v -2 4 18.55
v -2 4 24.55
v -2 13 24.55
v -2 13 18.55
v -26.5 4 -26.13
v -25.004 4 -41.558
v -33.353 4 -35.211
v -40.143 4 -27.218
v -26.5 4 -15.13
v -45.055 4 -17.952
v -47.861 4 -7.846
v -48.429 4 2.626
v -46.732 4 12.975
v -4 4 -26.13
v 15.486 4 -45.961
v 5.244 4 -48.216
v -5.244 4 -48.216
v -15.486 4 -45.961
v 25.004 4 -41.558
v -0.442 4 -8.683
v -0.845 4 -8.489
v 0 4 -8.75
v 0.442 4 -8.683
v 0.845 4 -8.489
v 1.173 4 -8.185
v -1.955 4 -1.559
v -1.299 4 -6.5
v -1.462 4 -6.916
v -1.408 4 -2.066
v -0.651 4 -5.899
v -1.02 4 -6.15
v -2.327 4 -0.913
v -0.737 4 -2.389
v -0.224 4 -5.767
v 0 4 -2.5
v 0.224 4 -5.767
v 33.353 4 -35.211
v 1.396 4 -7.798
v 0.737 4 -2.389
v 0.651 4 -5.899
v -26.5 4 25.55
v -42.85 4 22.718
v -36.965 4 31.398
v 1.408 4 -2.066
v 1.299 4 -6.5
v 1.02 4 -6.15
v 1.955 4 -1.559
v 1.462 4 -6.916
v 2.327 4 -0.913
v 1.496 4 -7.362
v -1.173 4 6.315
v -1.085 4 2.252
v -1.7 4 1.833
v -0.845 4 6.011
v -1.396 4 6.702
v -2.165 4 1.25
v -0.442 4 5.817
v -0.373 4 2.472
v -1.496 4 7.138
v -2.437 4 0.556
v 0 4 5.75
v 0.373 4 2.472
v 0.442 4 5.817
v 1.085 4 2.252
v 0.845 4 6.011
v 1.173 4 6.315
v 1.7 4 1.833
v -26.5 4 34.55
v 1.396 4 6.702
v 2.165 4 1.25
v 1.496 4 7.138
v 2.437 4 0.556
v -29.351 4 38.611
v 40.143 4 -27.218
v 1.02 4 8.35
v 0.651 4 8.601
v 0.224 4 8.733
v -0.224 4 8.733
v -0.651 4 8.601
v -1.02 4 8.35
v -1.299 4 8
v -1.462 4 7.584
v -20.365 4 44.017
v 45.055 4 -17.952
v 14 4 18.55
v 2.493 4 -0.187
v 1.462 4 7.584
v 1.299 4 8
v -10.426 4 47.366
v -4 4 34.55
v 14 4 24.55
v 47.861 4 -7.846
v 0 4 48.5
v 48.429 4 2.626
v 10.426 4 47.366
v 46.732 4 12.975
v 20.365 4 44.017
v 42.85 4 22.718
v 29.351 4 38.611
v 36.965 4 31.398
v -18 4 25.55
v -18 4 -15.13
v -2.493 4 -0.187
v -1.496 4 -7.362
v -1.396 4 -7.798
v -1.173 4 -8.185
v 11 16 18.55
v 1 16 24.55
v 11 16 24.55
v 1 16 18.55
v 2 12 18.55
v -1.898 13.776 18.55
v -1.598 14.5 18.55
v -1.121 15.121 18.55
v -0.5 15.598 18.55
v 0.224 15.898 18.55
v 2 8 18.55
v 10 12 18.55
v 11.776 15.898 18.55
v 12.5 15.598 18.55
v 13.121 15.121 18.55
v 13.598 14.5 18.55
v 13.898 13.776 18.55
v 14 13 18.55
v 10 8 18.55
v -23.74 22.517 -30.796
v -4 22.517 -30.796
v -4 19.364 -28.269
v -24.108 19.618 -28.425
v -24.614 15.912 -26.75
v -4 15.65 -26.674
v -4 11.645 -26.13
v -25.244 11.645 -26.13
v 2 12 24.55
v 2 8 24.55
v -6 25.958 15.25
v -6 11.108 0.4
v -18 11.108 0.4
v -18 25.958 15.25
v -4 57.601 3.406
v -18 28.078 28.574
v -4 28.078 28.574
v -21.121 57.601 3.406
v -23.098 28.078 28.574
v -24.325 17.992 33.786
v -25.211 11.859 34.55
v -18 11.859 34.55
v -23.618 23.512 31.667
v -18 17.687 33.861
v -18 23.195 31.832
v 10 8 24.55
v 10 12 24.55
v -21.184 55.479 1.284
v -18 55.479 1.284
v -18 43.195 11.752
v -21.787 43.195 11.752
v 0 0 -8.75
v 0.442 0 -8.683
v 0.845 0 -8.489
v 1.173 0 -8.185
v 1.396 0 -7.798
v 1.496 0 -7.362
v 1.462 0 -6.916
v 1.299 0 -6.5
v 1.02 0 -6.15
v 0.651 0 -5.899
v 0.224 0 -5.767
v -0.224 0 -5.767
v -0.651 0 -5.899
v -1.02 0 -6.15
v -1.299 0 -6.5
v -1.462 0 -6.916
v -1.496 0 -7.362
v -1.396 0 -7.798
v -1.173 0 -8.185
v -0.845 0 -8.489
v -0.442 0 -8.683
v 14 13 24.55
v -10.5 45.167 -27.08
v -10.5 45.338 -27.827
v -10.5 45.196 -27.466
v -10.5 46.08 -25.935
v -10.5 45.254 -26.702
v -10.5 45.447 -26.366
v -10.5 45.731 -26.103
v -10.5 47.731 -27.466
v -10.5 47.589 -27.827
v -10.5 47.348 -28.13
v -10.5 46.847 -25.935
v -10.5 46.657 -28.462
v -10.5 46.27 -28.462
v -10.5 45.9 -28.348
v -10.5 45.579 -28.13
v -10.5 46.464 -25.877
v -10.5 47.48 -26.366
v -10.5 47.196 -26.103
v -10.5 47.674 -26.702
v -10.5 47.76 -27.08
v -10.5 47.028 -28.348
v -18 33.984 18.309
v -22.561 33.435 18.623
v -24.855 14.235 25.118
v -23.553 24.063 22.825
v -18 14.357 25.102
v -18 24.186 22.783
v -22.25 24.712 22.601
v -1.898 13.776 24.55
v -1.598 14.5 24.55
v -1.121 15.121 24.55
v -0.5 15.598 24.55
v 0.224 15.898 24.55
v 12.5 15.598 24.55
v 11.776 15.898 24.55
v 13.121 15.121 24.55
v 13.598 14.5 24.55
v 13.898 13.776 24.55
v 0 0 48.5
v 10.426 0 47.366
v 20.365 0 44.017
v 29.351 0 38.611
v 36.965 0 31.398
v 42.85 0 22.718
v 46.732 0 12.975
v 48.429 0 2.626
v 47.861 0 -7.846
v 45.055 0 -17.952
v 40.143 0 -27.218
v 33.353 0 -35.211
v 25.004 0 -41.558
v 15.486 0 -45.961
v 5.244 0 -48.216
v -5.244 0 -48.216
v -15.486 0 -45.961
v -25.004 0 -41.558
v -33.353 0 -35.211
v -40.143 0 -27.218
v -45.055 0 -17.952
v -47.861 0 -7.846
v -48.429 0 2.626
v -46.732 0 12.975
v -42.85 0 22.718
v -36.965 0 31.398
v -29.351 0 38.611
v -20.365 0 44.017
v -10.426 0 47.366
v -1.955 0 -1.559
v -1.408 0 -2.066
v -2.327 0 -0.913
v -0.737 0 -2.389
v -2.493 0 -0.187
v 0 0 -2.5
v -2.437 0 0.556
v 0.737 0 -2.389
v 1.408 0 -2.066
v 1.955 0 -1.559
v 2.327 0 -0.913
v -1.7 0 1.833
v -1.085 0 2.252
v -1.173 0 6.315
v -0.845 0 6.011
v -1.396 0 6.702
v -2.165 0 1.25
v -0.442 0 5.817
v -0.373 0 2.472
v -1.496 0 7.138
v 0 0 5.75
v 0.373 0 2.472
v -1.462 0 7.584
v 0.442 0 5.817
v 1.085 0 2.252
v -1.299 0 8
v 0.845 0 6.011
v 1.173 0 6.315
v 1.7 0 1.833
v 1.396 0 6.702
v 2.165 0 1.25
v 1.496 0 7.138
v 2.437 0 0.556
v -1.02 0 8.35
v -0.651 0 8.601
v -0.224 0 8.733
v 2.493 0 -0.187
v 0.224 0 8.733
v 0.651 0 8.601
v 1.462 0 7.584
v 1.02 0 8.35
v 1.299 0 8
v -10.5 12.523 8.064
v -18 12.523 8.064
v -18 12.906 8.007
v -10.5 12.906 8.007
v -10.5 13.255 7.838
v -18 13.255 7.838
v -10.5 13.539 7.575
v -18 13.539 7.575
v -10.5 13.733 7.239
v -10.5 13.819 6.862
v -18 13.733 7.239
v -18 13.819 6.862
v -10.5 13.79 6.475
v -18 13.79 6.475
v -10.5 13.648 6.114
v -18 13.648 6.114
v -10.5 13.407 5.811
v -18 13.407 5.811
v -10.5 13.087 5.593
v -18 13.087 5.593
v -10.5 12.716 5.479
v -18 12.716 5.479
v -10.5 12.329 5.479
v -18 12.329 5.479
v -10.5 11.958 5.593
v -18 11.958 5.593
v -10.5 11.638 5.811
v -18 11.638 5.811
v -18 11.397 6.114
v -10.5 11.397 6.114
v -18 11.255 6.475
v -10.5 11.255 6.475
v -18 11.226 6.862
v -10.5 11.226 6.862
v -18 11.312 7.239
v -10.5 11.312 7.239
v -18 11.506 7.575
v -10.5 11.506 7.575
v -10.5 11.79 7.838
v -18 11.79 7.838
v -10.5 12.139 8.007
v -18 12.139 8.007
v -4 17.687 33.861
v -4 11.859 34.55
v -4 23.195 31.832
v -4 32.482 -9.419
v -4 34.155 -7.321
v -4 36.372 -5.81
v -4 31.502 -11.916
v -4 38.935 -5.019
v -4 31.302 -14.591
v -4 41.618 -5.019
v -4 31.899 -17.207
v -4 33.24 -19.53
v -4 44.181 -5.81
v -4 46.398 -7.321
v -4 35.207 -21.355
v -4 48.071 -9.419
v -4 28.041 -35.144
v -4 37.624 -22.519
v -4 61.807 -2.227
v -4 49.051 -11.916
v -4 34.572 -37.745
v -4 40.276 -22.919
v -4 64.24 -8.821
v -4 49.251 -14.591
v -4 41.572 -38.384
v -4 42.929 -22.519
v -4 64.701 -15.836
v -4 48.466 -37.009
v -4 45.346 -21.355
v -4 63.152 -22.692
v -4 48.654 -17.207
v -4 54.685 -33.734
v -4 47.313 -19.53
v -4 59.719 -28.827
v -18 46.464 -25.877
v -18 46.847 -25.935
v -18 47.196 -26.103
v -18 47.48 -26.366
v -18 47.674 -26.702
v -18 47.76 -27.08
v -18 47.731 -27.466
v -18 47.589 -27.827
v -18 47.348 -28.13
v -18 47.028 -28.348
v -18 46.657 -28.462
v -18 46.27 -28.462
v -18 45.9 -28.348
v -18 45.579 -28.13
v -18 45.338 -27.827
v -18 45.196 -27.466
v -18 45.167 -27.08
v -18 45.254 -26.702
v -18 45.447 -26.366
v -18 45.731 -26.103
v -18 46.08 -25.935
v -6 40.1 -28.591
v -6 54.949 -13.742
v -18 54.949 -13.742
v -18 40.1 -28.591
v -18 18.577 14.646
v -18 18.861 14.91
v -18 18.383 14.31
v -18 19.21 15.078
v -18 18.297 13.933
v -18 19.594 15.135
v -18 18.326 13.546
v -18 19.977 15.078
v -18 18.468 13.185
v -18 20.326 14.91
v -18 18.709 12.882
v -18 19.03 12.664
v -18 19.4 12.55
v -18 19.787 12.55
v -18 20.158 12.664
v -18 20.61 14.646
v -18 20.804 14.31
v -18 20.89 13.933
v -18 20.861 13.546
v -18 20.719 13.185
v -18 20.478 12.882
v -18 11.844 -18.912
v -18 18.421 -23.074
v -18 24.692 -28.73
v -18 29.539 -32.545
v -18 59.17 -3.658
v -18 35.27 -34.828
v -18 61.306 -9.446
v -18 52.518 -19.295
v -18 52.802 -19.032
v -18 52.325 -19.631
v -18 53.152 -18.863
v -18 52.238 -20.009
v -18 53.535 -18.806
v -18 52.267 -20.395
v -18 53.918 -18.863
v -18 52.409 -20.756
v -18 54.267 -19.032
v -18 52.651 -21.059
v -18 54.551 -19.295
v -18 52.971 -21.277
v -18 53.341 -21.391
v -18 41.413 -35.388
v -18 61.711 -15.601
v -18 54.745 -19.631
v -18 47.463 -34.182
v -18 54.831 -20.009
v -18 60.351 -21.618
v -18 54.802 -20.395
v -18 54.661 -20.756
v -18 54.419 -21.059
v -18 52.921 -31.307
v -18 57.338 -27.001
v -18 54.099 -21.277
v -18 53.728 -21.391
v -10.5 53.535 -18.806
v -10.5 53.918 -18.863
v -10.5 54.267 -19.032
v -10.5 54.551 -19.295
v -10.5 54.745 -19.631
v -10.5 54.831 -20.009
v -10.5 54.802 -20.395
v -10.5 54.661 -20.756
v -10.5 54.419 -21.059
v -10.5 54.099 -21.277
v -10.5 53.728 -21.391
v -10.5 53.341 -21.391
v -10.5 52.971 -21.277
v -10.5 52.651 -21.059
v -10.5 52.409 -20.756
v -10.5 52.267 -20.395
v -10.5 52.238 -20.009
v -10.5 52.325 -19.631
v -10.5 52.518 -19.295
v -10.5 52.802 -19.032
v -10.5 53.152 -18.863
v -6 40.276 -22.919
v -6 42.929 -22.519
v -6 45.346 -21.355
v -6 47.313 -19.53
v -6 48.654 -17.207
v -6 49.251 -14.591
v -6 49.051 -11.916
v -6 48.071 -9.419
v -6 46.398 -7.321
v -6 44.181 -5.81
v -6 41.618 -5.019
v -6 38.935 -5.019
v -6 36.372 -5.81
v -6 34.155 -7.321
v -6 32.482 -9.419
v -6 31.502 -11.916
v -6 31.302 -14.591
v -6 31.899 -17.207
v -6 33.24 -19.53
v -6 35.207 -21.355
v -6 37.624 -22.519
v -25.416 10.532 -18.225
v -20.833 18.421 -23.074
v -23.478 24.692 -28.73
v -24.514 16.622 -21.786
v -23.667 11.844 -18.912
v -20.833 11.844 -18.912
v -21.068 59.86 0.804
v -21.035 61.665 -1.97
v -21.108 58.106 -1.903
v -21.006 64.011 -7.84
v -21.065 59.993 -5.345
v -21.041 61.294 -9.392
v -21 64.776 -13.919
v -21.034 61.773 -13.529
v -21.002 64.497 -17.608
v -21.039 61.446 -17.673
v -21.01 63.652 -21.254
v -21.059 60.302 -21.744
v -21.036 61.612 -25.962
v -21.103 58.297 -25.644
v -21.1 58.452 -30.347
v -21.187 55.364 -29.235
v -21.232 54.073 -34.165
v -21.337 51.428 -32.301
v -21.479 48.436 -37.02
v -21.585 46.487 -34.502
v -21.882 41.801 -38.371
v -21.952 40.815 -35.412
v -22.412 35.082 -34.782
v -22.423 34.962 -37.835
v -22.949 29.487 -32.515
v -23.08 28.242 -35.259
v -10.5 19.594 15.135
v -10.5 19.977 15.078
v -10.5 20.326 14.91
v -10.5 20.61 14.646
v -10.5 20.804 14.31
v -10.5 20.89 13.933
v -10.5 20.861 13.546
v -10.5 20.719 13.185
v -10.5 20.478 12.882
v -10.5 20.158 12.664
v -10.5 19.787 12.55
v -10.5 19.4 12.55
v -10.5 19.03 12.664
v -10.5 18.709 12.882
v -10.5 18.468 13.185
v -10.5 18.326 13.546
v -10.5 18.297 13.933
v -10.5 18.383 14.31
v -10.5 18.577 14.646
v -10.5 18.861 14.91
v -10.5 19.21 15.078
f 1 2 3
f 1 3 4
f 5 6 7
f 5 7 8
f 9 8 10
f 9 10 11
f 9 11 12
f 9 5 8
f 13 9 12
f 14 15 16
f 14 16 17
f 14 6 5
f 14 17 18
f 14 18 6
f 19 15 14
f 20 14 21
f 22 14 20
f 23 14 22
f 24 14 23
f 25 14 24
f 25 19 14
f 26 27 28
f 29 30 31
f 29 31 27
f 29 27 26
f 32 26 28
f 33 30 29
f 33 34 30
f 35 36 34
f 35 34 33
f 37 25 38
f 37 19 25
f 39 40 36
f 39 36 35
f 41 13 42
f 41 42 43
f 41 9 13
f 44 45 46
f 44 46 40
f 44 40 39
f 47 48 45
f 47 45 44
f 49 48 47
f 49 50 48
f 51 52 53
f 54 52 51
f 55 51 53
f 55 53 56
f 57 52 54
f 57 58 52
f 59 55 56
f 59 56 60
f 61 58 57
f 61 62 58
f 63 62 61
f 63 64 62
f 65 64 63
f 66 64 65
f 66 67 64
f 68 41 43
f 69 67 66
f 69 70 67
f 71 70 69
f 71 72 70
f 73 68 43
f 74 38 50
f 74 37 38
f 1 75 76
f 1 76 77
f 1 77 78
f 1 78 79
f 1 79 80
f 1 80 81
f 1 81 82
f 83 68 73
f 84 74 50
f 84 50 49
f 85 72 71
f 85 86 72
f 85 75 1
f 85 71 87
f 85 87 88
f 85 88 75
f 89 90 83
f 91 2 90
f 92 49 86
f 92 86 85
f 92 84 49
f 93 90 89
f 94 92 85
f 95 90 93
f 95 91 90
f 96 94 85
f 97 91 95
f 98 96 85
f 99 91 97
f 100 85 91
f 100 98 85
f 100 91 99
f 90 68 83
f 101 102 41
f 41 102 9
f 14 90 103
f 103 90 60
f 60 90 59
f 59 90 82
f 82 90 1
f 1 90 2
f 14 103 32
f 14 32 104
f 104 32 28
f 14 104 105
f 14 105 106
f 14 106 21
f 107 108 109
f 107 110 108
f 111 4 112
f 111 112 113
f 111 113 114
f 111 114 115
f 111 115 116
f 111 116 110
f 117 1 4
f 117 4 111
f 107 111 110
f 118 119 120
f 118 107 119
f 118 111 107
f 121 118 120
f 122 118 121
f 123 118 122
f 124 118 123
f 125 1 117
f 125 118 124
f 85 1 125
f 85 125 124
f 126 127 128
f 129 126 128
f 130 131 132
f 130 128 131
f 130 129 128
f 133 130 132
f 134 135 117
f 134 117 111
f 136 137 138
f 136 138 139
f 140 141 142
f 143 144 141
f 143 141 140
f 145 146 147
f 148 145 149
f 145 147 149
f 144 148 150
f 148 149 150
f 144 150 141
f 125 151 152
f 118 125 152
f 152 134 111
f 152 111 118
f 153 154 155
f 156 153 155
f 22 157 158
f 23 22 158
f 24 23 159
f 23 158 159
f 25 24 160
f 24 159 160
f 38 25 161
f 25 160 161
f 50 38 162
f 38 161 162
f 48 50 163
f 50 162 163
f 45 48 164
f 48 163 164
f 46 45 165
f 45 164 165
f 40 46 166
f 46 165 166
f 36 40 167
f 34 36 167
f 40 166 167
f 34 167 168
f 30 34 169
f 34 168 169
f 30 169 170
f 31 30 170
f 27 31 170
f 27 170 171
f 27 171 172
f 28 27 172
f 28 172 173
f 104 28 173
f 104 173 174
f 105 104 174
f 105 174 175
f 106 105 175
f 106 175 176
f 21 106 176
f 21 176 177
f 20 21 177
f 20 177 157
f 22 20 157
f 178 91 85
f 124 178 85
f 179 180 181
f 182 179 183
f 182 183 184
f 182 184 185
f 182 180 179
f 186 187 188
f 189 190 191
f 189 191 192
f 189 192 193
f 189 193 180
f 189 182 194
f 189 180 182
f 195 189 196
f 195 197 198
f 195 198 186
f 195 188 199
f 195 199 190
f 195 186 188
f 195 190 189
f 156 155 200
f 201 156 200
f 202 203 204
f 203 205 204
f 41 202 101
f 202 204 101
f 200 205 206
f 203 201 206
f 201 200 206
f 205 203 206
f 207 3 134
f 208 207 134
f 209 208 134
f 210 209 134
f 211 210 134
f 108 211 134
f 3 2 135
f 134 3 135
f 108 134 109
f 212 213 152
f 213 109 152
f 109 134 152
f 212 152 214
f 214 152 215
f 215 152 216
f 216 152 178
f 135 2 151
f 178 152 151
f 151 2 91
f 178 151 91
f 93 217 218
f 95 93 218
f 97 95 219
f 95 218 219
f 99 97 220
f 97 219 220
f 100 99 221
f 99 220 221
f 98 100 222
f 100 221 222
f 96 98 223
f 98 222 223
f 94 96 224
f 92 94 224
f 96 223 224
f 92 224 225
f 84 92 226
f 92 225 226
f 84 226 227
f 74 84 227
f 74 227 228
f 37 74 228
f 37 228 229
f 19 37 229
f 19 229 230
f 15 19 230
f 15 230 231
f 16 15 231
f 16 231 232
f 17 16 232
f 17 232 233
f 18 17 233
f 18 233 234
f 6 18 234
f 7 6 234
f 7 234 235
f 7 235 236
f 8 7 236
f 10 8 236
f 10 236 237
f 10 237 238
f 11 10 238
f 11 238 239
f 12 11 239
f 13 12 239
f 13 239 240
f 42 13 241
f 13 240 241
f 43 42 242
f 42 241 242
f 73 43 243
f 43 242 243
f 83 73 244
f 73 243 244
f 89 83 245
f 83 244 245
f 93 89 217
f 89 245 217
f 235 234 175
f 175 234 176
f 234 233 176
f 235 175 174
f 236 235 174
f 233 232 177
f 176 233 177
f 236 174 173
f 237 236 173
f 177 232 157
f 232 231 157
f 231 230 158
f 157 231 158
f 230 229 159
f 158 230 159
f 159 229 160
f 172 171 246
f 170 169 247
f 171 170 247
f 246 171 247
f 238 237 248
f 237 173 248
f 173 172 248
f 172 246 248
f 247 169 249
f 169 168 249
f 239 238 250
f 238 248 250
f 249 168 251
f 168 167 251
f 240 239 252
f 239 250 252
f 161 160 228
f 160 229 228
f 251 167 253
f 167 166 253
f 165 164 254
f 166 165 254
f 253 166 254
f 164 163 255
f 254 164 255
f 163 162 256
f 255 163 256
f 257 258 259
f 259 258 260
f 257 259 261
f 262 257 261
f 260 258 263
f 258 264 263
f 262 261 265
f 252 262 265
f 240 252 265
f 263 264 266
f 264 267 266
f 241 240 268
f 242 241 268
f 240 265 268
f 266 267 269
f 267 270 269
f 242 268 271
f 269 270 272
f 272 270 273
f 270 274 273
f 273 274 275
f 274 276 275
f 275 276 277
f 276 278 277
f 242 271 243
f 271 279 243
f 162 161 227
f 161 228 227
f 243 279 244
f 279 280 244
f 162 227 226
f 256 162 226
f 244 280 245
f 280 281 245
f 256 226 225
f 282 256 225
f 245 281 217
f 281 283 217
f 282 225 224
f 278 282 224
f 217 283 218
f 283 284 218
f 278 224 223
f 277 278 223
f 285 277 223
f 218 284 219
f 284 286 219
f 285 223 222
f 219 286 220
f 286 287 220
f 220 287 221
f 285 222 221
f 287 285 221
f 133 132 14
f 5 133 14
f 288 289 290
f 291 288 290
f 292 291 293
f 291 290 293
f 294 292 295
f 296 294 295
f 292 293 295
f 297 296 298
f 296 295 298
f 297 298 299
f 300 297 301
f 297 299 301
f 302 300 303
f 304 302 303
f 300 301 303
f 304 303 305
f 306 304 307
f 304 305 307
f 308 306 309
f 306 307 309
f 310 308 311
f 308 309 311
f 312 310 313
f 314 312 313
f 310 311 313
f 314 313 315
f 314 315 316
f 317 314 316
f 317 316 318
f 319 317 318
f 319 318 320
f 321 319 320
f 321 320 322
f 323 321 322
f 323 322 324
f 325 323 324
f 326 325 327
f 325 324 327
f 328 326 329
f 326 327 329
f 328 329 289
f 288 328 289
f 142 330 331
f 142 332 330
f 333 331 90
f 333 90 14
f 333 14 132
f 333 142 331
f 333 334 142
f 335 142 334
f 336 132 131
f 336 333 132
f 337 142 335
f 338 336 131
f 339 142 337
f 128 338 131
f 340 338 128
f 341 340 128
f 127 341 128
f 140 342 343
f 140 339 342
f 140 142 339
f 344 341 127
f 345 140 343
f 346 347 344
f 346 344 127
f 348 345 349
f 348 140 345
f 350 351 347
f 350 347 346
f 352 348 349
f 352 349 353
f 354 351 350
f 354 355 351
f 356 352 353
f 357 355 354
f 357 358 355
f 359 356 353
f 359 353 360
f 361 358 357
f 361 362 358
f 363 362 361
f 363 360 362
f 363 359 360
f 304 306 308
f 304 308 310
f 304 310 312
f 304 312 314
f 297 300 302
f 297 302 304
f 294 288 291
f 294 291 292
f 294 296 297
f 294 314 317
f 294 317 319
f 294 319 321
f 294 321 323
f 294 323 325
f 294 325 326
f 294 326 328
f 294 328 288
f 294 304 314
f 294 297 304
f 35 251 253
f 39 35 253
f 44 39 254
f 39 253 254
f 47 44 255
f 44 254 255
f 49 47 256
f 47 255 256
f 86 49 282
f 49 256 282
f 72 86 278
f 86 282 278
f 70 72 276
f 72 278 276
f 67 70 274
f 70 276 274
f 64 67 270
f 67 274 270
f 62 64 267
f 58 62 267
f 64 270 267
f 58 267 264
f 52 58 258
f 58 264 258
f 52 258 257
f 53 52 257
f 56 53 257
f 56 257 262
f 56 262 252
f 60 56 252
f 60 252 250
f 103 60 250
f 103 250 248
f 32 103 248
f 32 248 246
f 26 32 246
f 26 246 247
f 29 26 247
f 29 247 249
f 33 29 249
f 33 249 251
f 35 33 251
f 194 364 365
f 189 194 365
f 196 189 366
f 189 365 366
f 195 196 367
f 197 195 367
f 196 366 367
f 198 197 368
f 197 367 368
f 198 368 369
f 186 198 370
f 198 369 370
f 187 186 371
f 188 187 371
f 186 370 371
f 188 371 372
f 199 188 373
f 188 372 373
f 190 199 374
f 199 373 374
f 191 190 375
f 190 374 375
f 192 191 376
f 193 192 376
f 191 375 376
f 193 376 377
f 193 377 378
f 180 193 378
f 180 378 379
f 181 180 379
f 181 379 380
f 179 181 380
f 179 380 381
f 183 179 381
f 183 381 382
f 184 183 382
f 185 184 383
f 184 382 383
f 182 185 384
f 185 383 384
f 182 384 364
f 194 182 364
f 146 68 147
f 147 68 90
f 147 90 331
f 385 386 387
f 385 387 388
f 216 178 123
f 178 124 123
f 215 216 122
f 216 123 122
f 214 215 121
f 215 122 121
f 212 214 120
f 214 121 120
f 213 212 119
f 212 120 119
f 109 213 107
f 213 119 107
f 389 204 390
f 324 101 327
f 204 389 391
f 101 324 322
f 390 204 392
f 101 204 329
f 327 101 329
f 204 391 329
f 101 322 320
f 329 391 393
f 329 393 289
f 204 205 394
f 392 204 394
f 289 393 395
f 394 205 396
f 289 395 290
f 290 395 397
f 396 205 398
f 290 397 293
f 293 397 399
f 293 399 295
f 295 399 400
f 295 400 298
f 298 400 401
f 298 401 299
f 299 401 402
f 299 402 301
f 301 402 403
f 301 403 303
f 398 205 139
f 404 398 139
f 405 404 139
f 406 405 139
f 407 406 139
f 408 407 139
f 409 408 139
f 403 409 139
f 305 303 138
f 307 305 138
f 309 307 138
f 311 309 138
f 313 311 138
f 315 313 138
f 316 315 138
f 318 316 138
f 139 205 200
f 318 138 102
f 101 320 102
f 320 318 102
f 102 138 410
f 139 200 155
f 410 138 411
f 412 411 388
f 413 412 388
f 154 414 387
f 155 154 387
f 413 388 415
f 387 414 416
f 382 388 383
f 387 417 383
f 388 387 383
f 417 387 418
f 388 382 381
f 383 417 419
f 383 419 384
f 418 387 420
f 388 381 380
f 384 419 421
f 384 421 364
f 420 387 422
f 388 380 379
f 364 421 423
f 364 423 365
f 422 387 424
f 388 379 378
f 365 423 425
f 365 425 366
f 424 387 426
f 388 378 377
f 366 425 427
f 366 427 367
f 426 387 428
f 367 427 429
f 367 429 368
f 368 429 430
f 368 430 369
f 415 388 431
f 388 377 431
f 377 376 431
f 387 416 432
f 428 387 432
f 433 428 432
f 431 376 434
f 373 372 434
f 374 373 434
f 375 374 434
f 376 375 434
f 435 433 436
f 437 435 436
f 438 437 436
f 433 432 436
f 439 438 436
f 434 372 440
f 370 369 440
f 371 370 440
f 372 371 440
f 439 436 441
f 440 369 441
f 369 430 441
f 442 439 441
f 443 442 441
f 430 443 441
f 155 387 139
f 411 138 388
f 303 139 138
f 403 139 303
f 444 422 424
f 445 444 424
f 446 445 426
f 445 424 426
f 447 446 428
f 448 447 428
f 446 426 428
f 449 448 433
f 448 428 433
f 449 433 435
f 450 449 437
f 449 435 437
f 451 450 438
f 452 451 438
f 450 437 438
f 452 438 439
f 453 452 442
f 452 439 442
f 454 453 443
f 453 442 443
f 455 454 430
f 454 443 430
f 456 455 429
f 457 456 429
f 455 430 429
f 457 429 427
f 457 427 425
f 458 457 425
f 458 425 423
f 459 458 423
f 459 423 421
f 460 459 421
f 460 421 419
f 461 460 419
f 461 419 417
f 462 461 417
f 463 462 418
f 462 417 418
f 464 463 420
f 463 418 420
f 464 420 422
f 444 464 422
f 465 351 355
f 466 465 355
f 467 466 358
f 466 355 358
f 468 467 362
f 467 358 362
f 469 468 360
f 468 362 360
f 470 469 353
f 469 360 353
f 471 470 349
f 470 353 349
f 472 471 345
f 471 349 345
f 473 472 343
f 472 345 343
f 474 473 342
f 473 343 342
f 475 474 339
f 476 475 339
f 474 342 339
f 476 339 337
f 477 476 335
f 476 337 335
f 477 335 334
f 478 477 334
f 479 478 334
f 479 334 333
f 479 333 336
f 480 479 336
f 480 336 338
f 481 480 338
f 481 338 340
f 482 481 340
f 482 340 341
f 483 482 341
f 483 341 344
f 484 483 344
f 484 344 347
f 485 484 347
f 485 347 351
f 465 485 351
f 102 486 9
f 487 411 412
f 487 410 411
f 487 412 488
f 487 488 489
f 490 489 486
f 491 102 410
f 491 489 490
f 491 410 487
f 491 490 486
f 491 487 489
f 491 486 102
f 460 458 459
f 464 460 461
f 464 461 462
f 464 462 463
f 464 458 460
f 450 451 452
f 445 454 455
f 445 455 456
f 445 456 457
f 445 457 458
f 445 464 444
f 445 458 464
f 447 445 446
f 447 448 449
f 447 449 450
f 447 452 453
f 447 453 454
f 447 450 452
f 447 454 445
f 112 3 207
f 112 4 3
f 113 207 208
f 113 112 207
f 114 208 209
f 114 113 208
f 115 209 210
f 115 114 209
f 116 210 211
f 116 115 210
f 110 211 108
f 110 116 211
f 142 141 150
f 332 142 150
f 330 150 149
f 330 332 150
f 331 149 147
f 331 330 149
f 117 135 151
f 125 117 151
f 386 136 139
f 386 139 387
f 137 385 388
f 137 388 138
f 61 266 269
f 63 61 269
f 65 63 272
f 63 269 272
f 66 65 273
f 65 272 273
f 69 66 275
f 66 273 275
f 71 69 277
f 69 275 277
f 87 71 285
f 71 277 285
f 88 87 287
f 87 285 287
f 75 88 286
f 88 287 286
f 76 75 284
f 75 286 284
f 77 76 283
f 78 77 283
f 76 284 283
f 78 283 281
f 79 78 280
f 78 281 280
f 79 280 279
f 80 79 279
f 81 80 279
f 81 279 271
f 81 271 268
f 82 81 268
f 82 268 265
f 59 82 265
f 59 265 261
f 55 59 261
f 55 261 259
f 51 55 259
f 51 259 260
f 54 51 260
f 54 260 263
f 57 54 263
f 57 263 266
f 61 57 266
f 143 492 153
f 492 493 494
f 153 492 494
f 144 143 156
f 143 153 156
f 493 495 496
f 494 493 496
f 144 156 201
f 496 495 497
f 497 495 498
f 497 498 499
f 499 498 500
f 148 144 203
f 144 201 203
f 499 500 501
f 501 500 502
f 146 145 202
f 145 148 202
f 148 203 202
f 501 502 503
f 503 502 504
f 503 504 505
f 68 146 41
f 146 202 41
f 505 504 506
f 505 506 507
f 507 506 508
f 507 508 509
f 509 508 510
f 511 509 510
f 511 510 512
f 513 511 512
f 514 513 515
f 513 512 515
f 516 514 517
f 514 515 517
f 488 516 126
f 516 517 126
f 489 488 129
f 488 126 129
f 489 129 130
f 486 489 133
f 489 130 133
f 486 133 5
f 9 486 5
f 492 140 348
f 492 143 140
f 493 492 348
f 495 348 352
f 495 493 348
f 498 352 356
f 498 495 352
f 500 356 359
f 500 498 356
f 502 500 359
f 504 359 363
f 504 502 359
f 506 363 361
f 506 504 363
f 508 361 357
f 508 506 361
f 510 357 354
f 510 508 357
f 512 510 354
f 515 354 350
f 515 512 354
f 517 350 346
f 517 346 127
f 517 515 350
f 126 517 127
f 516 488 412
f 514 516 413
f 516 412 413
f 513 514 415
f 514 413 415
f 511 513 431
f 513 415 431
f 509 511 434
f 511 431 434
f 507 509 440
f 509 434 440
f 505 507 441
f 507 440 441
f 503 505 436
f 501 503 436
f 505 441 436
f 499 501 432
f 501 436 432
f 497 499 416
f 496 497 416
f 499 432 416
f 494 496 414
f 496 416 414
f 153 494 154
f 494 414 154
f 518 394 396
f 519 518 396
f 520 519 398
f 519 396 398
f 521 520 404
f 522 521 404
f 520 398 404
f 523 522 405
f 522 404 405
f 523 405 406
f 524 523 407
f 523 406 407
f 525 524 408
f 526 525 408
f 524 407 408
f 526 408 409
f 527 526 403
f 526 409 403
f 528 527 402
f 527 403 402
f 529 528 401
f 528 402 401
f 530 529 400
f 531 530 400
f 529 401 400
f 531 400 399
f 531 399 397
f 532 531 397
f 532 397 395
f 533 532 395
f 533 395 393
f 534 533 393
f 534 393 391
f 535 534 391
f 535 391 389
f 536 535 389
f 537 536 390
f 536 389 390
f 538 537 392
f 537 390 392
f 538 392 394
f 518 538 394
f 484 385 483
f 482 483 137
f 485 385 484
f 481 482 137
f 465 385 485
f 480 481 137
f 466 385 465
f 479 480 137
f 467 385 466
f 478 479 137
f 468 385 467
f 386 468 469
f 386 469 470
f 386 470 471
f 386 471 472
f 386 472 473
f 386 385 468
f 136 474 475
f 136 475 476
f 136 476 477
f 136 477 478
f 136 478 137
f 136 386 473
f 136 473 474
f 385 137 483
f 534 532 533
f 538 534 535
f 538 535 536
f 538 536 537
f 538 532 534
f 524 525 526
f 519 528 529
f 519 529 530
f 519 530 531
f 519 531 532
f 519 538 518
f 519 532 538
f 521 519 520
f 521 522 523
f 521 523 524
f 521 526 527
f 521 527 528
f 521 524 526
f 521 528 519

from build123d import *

# Parameters (mm, degrees)
SKETCH2_R                       = 48.5
BOSS_EXTRUDE1_DEPTH             = 4
SKETCH4_R                       = 1.5
CUT_EXTRUDE2_DEPTH              = 69.705894944
SKETCH5_R                       = 2.5
CUT_EXTRUDE3_DEPTH              = 69.705894944
BOSS_EXTRUDE2_DEPTH             = 14
CUT_EXTRUDE5_REACH              = 97.597
SKETCH9_R                       = 1.3
CUT_EXTRUDE6_DEPTH              = 7.5
CUT_EXTRUDE9_REACH              = 96.471
SKETCH11_R                      = 9
BOSS_EXTRUDE7_DEPTH             = 9
BOSS_EXTRUDE7_DIRECTION_2_REACH = 104.912
BOSS_EXTRUDE10_DEPTH            = 9
SKETCH27_W                      = 16
SKETCH27_H                      = 6
BOSS_EXTRUDE11_DEPTH            = 12
FILLET6_R                       = 3
CUT_EXTRUDE16_REACH             = 111.016
SKETCH28_W                      = 8
SKETCH28_H                      = 4
CUT_EXTRUDE17_DEPTH             = 95.342420983
CUT_EXTRUDE17_DEPTH_BACK        = 95.342420983


with BuildPart() as part:
    # Sketch2 → Boss-Extrude1 (new body)
    with BuildSketch(Plane(origin=(0, 0, 0), x_dir=(1, 0, 0), z_dir=(0, 1, 0))):
        with Locations(Location((0, 0, 0), (0, 0, 270))):
            Circle(SKETCH2_R)
    extrude(amount=BOSS_EXTRUDE1_DEPTH)

    # Sketch4 → Cut-Extrude2 (cut, through all)
    with BuildSketch(Plane.XZ):
        with Locations(Location((0, 7.25, 0), (0, 0, 270))):
            Circle(SKETCH4_R)
        with Locations(Location((0, -7.25, 0), (0, 0, 270))):
            Circle(SKETCH4_R)
    extrude(amount=-CUT_EXTRUDE2_DEPTH, mode=Mode.SUBTRACT)

    # Sketch5 → Cut-Extrude3 (cut, through all)
    with BuildSketch(Plane.XZ):
        with Locations(Location((0, 0, 0), (0, 0, 270))):
            Circle(SKETCH5_R)
    extrude(amount=-CUT_EXTRUDE3_DEPTH, mode=Mode.SUBTRACT)

    # Sketch7 → Boss-Extrude2 (add)
    with BuildSketch(Plane(origin=(-4, 0, 0), x_dir=(0, 0, -1), z_dir=(1, 0, 0))):
        with BuildLine():
            Line((23.129947874, 4), (23.129947874, 11.644549616))
            ThreePointArc((23.129947874, 11.644549616), (24.589048403, 18.743749901), (28.729797284, 24.692011643))
            ThreePointArc((28.729797284, 24.692011643), (29.313383054, 55.284736897), (-1.284289494, 55.479275971))
            Line((-1.284289494, 55.479275971), (-27.227315747, 29.536249718))
            ThreePointArc((-27.227315747, 29.536249718), (-32.64663453, 21.425665997), (-34.549646217, 11.858580188))
            Line((-34.549646217, 11.858580188), (-34.549646217, 4))
            Line((-34.549646217, 4), (23.129947874, 4))
        make_face()
    extrude(amount=-BOSS_EXTRUDE2_DEPTH)

    # Sketch8 → Cut-Extrude5 (cut, up to next)
    with BuildSketch(Plane(origin=(-6, 0, 0), x_dir=(0, 0, -1), z_dir=(1, 0, 0)), mode=Mode.PRIVATE) as cut_extrude5_sk1:
        Polygon((-15.249648422, 25.957567857), (13.741729607, 54.948945886), (28.590972012, 40.099703481), (-0.400406017, 11.108325452), align=None)
    cut_extrude5_tool1 = extrude(cut_extrude5_sk1.sketch, amount=-CUT_EXTRUDE5_REACH, mode=Mode.PRIVATE) & part.part
    add(cut_extrude5_tool1.solids().sort_by_distance((-6, 33.028636, -6.670662))[0], mode=Mode.SUBTRACT)

    # Sketch9 → Cut-Extrude6 (cut)
    with BuildSketch(Plane.ZY.offset(18)):
        with Locations((-20.105690637, 53.534732323)):
            Circle(SKETCH9_R)
        with Locations((-27.176758449, 46.463664511)):
            Circle(SKETCH9_R)
        with Locations((6.764367048, 12.522539014)):
            Circle(SKETCH9_R)
        with Locations((13.83543486, 19.593606826)):
            Circle(SKETCH9_R)
    extrude(amount=-CUT_EXTRUDE6_DEPTH, mode=Mode.SUBTRACT)

    # Sketch11 → Cut-Extrude9 (cut, up to next)
    with BuildSketch(Plane(origin=(-4, 0, 0), x_dir=(0, 0, -1), z_dir=(1, 0, 0)), mode=Mode.PRIVATE) as cut_extrude9_sk1:
        with Locations((13.918506302, 40.276480176)):
            Circle(SKETCH11_R)
    cut_extrude9_tool1 = extrude(cut_extrude9_sk1.sketch, amount=-CUT_EXTRUDE9_REACH, mode=Mode.PRIVATE) & part.part
    add(cut_extrude9_tool1.solids().sort_by_distance((-4, 40.27648, -13.918506))[0], mode=Mode.SUBTRACT)

    # Sketch17 → Boss-Extrude7 (add)
    with BuildSketch(Plane.ZY.offset(18)):
        with BuildLine():
            ThreePointArc((34.549646217, 11.858580188), (33.008342843, 20.500891953), (28.574482006, 28.077569775))
            ThreePointArc((28.574482006, 28.077569775), (27.915386359, 28.820289685), (27.227315747, 29.536249718))
            Line((27.227315747, 29.536249718), (1.284289494, 55.479275971))
            Line((1.284289494, 55.479275971), (26.295003593, 26.127182305))
            ThreePointArc((26.295003593, 26.127182305), (30.194232218, 19.461281607), (31.549646217, 11.858580188))
            Line((31.549646217, 11.858580188), (31.549646217, 4))
            Line((31.549646217, 4), (34.549646217, 4))
            Line((34.549646217, 4), (34.549646217, 11.858580188))
        make_face()
        with BuildLine():
            Line((28.574482006, 28.077569775), (3.405609837, 57.600596315))
            ThreePointArc((3.405609837, 57.600596315), (-31.461505391, 57.378912253), (-30.796489049, 22.517434639))
            ThreePointArc((-30.796489049, 22.517434639), (-27.345864981, 17.560549854), (-26.129947874, 11.644549616))
            Line((-26.129947874, 11.644549616), (-26.129947874, 4))
            Line((-26.129947874, 4), (-23.129947874, 4))
            Line((-23.129947874, 4), (-23.129947874, 11.644549616))
            ThreePointArc((-23.129947874, 11.644549616), (-24.589048403, 18.743749901), (-28.729797284, 24.692011643))
            ThreePointArc((-28.729797284, 24.692011643), (-29.313383054, 55.284736897), (1.284289494, 55.479275971))
            Line((1.284289494, 55.479275971), (27.227315747, 29.536249718))
            ThreePointArc((27.227315747, 29.536249718), (27.915386359, 28.820289685), (28.574482006, 28.077569775))
        make_face()
    extrude(amount=BOSS_EXTRUDE7_DEPTH)

    # Boss-Extrude7 direction 2: up to this face of the body (flat: up to its plane)
    boss_extrude7_direction_2_end = Plane(part.part.faces().sort_by_distance((-4, 28.276431801, -1.649713195))[0])
    # Sketch17 → Boss-Extrude7 direction 2 (add, up to the picked face)
    with BuildSketch(Plane.ZY.offset(18), mode=Mode.PRIVATE) as boss_extrude7_direction_2_sk1:
        with BuildLine():
            ThreePointArc((34.549646217, 11.858580188), (33.008342843, 20.500891953), (28.574482006, 28.077569775))
            ThreePointArc((28.574482006, 28.077569775), (27.915386359, 28.820289685), (27.227315747, 29.536249718))
            Line((27.227315747, 29.536249718), (1.284289494, 55.479275971))
            Line((1.284289494, 55.479275971), (26.295003593, 26.127182305))
            ThreePointArc((26.295003593, 26.127182305), (30.194232218, 19.461281607), (31.549646217, 11.858580188))
            Line((31.549646217, 11.858580188), (31.549646217, 4))
            Line((31.549646217, 4), (34.549646217, 4))
            Line((34.549646217, 4), (34.549646217, 11.858580188))
        make_face()
    boss_extrude7_direction_2_tool1 = split(extrude(boss_extrude7_direction_2_sk1.sketch, amount=-BOSS_EXTRUDE7_DIRECTION_2_REACH, mode=Mode.PRIVATE), bisect_by=boss_extrude7_direction_2_end, keep=Keep.BOTH, mode=Mode.PRIVATE)
    # Sketch17 → Boss-Extrude7 direction 2 (add, up to the picked face)
    with BuildSketch(Plane.ZY.offset(18), mode=Mode.PRIVATE) as boss_extrude7_direction_2_sk2:
        with BuildLine():
            Line((28.574482006, 28.077569775), (3.405609837, 57.600596315))
            ThreePointArc((3.405609837, 57.600596315), (-31.461505391, 57.378912253), (-30.796489049, 22.517434639))
            ThreePointArc((-30.796489049, 22.517434639), (-27.345864981, 17.560549854), (-26.129947874, 11.644549616))
            Line((-26.129947874, 11.644549616), (-26.129947874, 4))
            Line((-26.129947874, 4), (-23.129947874, 4))
            Line((-23.129947874, 4), (-23.129947874, 11.644549616))
            ThreePointArc((-23.129947874, 11.644549616), (-24.589048403, 18.743749901), (-28.729797284, 24.692011643))
            ThreePointArc((-28.729797284, 24.692011643), (-29.313383054, 55.284736897), (1.284289494, 55.479275971))
            Line((1.284289494, 55.479275971), (27.227315747, 29.536249718))
            ThreePointArc((27.227315747, 29.536249718), (27.915386359, 28.820289685), (28.574482006, 28.077569775))
        make_face()
    boss_extrude7_direction_2_tool2 = split(extrude(boss_extrude7_direction_2_sk2.sketch, amount=-BOSS_EXTRUDE7_DIRECTION_2_REACH, mode=Mode.PRIVATE), bisect_by=boss_extrude7_direction_2_end, keep=Keep.BOTH, mode=Mode.PRIVATE)
    add(boss_extrude7_direction_2_tool1.solids().sort_by(Axis((-18, 4.612919, 33.049646), (1, 0, 0)))[0])
    add(boss_extrude7_direction_2_tool2.solids().sort_by(Axis((-18, 43.147366, 14.895406), (1, 0, 0)))[0])

    # Sketch25 → Boss-Extrude10 (add)
    with BuildSketch(Plane.ZY.offset(18)):
        with BuildLine():
            ThreePointArc((-28.729797284, 24.692011643), (-24.589048403, 18.743749901), (-23.129947874, 11.644549616))
            Line((-23.129947874, 11.644549616), (-23.129947874, 4))
            Line((-23.129947874, 4), (-15.129947874, 4))
            add(Edge.make_bspline(
                [(-28.729797284, 24.692011643), (-21.954867515, 18.253200081), (-19.09405247, 12.798017691), (-15.129947874, 4)],
                knots=[0, 0, 0, 0, 1, 1, 1, 1], degree=3))
        make_face()
        with BuildLine():
            add(Edge.make_bspline(
                [(11.751619577, 43.19501844), (26.551255916, 25.8264495), (25.549646217, 4)],
                knots=[0, 0, 0, 1, 1, 1], degree=2))
            Line((25.549646217, 4), (31.549646217, 4))
            Line((31.549646217, 4), (31.549646217, 11.858580188))
            ThreePointArc((31.549646217, 11.858580188), (30.194232218, 19.461281607), (26.295003593, 26.127182305))
            Line((26.295003593, 26.127182305), (11.751619577, 43.19501844))
        make_face()
    extrude(amount=BOSS_EXTRUDE10_DEPTH)

    # Sketch27 → Boss-Extrude11 (add)
    with BuildSketch(Plane(origin=(0, 4, 0), x_dir=(1, 0, 0), z_dir=(0, 1, 0))):
        with Locations((6, -21.549646217)):
            Rectangle(SKETCH27_W, SKETCH27_H)
    extrude(amount=BOSS_EXTRUDE11_DEPTH)

    # Fillet6
    fillet6_edges = [part.edges().sort_by_distance(p)[0] for p in [
        (-2, 16, 21.549646217),
        (14, 16, 21.549646217),
    ]]
    fillet(fillet6_edges, radius=FILLET6_R)

    # Sketch28 → Cut-Extrude16 (cut, up to next)
    with BuildSketch(Plane.XY.offset(24.549646217), mode=Mode.PRIVATE) as cut_extrude16_sk1:
        with Locations((6, 10)):
            Rectangle(SKETCH28_W, SKETCH28_H)
    cut_extrude16_tool1 = extrude(cut_extrude16_sk1.sketch, amount=-CUT_EXTRUDE16_REACH, mode=Mode.PRIVATE) & part.part
    add(cut_extrude16_tool1.solids().sort_by_distance((6, 10, 24.549646))[0], mode=Mode.SUBTRACT)

    # Sketch29 → Cut-Extrude17 (cut, two sides: drawn at the far end of the back side and taken through both)
    with BuildSketch(Plane.XY.offset(-CUT_EXTRUDE17_DEPTH_BACK)):
        with BuildLine():
            Line((-21, 64.776480176), (-27, 64.776480176))
            Line((-27, 64.776480176), (-27, 4))
            Line((-27, 4), (-26.5, 4))
            add(Edge.make_bspline(
                [(-21, 64.776480176), (-21.220459696, 34.140901434), (-26.5, 4)],
                knots=[0, 0, 0, 1, 1, 1], degree=2))
        make_face()
    extrude(amount=CUT_EXTRUDE17_DEPTH + CUT_EXTRUDE17_DEPTH_BACK, mode=Mode.SUBTRACT)


solid = part.part
